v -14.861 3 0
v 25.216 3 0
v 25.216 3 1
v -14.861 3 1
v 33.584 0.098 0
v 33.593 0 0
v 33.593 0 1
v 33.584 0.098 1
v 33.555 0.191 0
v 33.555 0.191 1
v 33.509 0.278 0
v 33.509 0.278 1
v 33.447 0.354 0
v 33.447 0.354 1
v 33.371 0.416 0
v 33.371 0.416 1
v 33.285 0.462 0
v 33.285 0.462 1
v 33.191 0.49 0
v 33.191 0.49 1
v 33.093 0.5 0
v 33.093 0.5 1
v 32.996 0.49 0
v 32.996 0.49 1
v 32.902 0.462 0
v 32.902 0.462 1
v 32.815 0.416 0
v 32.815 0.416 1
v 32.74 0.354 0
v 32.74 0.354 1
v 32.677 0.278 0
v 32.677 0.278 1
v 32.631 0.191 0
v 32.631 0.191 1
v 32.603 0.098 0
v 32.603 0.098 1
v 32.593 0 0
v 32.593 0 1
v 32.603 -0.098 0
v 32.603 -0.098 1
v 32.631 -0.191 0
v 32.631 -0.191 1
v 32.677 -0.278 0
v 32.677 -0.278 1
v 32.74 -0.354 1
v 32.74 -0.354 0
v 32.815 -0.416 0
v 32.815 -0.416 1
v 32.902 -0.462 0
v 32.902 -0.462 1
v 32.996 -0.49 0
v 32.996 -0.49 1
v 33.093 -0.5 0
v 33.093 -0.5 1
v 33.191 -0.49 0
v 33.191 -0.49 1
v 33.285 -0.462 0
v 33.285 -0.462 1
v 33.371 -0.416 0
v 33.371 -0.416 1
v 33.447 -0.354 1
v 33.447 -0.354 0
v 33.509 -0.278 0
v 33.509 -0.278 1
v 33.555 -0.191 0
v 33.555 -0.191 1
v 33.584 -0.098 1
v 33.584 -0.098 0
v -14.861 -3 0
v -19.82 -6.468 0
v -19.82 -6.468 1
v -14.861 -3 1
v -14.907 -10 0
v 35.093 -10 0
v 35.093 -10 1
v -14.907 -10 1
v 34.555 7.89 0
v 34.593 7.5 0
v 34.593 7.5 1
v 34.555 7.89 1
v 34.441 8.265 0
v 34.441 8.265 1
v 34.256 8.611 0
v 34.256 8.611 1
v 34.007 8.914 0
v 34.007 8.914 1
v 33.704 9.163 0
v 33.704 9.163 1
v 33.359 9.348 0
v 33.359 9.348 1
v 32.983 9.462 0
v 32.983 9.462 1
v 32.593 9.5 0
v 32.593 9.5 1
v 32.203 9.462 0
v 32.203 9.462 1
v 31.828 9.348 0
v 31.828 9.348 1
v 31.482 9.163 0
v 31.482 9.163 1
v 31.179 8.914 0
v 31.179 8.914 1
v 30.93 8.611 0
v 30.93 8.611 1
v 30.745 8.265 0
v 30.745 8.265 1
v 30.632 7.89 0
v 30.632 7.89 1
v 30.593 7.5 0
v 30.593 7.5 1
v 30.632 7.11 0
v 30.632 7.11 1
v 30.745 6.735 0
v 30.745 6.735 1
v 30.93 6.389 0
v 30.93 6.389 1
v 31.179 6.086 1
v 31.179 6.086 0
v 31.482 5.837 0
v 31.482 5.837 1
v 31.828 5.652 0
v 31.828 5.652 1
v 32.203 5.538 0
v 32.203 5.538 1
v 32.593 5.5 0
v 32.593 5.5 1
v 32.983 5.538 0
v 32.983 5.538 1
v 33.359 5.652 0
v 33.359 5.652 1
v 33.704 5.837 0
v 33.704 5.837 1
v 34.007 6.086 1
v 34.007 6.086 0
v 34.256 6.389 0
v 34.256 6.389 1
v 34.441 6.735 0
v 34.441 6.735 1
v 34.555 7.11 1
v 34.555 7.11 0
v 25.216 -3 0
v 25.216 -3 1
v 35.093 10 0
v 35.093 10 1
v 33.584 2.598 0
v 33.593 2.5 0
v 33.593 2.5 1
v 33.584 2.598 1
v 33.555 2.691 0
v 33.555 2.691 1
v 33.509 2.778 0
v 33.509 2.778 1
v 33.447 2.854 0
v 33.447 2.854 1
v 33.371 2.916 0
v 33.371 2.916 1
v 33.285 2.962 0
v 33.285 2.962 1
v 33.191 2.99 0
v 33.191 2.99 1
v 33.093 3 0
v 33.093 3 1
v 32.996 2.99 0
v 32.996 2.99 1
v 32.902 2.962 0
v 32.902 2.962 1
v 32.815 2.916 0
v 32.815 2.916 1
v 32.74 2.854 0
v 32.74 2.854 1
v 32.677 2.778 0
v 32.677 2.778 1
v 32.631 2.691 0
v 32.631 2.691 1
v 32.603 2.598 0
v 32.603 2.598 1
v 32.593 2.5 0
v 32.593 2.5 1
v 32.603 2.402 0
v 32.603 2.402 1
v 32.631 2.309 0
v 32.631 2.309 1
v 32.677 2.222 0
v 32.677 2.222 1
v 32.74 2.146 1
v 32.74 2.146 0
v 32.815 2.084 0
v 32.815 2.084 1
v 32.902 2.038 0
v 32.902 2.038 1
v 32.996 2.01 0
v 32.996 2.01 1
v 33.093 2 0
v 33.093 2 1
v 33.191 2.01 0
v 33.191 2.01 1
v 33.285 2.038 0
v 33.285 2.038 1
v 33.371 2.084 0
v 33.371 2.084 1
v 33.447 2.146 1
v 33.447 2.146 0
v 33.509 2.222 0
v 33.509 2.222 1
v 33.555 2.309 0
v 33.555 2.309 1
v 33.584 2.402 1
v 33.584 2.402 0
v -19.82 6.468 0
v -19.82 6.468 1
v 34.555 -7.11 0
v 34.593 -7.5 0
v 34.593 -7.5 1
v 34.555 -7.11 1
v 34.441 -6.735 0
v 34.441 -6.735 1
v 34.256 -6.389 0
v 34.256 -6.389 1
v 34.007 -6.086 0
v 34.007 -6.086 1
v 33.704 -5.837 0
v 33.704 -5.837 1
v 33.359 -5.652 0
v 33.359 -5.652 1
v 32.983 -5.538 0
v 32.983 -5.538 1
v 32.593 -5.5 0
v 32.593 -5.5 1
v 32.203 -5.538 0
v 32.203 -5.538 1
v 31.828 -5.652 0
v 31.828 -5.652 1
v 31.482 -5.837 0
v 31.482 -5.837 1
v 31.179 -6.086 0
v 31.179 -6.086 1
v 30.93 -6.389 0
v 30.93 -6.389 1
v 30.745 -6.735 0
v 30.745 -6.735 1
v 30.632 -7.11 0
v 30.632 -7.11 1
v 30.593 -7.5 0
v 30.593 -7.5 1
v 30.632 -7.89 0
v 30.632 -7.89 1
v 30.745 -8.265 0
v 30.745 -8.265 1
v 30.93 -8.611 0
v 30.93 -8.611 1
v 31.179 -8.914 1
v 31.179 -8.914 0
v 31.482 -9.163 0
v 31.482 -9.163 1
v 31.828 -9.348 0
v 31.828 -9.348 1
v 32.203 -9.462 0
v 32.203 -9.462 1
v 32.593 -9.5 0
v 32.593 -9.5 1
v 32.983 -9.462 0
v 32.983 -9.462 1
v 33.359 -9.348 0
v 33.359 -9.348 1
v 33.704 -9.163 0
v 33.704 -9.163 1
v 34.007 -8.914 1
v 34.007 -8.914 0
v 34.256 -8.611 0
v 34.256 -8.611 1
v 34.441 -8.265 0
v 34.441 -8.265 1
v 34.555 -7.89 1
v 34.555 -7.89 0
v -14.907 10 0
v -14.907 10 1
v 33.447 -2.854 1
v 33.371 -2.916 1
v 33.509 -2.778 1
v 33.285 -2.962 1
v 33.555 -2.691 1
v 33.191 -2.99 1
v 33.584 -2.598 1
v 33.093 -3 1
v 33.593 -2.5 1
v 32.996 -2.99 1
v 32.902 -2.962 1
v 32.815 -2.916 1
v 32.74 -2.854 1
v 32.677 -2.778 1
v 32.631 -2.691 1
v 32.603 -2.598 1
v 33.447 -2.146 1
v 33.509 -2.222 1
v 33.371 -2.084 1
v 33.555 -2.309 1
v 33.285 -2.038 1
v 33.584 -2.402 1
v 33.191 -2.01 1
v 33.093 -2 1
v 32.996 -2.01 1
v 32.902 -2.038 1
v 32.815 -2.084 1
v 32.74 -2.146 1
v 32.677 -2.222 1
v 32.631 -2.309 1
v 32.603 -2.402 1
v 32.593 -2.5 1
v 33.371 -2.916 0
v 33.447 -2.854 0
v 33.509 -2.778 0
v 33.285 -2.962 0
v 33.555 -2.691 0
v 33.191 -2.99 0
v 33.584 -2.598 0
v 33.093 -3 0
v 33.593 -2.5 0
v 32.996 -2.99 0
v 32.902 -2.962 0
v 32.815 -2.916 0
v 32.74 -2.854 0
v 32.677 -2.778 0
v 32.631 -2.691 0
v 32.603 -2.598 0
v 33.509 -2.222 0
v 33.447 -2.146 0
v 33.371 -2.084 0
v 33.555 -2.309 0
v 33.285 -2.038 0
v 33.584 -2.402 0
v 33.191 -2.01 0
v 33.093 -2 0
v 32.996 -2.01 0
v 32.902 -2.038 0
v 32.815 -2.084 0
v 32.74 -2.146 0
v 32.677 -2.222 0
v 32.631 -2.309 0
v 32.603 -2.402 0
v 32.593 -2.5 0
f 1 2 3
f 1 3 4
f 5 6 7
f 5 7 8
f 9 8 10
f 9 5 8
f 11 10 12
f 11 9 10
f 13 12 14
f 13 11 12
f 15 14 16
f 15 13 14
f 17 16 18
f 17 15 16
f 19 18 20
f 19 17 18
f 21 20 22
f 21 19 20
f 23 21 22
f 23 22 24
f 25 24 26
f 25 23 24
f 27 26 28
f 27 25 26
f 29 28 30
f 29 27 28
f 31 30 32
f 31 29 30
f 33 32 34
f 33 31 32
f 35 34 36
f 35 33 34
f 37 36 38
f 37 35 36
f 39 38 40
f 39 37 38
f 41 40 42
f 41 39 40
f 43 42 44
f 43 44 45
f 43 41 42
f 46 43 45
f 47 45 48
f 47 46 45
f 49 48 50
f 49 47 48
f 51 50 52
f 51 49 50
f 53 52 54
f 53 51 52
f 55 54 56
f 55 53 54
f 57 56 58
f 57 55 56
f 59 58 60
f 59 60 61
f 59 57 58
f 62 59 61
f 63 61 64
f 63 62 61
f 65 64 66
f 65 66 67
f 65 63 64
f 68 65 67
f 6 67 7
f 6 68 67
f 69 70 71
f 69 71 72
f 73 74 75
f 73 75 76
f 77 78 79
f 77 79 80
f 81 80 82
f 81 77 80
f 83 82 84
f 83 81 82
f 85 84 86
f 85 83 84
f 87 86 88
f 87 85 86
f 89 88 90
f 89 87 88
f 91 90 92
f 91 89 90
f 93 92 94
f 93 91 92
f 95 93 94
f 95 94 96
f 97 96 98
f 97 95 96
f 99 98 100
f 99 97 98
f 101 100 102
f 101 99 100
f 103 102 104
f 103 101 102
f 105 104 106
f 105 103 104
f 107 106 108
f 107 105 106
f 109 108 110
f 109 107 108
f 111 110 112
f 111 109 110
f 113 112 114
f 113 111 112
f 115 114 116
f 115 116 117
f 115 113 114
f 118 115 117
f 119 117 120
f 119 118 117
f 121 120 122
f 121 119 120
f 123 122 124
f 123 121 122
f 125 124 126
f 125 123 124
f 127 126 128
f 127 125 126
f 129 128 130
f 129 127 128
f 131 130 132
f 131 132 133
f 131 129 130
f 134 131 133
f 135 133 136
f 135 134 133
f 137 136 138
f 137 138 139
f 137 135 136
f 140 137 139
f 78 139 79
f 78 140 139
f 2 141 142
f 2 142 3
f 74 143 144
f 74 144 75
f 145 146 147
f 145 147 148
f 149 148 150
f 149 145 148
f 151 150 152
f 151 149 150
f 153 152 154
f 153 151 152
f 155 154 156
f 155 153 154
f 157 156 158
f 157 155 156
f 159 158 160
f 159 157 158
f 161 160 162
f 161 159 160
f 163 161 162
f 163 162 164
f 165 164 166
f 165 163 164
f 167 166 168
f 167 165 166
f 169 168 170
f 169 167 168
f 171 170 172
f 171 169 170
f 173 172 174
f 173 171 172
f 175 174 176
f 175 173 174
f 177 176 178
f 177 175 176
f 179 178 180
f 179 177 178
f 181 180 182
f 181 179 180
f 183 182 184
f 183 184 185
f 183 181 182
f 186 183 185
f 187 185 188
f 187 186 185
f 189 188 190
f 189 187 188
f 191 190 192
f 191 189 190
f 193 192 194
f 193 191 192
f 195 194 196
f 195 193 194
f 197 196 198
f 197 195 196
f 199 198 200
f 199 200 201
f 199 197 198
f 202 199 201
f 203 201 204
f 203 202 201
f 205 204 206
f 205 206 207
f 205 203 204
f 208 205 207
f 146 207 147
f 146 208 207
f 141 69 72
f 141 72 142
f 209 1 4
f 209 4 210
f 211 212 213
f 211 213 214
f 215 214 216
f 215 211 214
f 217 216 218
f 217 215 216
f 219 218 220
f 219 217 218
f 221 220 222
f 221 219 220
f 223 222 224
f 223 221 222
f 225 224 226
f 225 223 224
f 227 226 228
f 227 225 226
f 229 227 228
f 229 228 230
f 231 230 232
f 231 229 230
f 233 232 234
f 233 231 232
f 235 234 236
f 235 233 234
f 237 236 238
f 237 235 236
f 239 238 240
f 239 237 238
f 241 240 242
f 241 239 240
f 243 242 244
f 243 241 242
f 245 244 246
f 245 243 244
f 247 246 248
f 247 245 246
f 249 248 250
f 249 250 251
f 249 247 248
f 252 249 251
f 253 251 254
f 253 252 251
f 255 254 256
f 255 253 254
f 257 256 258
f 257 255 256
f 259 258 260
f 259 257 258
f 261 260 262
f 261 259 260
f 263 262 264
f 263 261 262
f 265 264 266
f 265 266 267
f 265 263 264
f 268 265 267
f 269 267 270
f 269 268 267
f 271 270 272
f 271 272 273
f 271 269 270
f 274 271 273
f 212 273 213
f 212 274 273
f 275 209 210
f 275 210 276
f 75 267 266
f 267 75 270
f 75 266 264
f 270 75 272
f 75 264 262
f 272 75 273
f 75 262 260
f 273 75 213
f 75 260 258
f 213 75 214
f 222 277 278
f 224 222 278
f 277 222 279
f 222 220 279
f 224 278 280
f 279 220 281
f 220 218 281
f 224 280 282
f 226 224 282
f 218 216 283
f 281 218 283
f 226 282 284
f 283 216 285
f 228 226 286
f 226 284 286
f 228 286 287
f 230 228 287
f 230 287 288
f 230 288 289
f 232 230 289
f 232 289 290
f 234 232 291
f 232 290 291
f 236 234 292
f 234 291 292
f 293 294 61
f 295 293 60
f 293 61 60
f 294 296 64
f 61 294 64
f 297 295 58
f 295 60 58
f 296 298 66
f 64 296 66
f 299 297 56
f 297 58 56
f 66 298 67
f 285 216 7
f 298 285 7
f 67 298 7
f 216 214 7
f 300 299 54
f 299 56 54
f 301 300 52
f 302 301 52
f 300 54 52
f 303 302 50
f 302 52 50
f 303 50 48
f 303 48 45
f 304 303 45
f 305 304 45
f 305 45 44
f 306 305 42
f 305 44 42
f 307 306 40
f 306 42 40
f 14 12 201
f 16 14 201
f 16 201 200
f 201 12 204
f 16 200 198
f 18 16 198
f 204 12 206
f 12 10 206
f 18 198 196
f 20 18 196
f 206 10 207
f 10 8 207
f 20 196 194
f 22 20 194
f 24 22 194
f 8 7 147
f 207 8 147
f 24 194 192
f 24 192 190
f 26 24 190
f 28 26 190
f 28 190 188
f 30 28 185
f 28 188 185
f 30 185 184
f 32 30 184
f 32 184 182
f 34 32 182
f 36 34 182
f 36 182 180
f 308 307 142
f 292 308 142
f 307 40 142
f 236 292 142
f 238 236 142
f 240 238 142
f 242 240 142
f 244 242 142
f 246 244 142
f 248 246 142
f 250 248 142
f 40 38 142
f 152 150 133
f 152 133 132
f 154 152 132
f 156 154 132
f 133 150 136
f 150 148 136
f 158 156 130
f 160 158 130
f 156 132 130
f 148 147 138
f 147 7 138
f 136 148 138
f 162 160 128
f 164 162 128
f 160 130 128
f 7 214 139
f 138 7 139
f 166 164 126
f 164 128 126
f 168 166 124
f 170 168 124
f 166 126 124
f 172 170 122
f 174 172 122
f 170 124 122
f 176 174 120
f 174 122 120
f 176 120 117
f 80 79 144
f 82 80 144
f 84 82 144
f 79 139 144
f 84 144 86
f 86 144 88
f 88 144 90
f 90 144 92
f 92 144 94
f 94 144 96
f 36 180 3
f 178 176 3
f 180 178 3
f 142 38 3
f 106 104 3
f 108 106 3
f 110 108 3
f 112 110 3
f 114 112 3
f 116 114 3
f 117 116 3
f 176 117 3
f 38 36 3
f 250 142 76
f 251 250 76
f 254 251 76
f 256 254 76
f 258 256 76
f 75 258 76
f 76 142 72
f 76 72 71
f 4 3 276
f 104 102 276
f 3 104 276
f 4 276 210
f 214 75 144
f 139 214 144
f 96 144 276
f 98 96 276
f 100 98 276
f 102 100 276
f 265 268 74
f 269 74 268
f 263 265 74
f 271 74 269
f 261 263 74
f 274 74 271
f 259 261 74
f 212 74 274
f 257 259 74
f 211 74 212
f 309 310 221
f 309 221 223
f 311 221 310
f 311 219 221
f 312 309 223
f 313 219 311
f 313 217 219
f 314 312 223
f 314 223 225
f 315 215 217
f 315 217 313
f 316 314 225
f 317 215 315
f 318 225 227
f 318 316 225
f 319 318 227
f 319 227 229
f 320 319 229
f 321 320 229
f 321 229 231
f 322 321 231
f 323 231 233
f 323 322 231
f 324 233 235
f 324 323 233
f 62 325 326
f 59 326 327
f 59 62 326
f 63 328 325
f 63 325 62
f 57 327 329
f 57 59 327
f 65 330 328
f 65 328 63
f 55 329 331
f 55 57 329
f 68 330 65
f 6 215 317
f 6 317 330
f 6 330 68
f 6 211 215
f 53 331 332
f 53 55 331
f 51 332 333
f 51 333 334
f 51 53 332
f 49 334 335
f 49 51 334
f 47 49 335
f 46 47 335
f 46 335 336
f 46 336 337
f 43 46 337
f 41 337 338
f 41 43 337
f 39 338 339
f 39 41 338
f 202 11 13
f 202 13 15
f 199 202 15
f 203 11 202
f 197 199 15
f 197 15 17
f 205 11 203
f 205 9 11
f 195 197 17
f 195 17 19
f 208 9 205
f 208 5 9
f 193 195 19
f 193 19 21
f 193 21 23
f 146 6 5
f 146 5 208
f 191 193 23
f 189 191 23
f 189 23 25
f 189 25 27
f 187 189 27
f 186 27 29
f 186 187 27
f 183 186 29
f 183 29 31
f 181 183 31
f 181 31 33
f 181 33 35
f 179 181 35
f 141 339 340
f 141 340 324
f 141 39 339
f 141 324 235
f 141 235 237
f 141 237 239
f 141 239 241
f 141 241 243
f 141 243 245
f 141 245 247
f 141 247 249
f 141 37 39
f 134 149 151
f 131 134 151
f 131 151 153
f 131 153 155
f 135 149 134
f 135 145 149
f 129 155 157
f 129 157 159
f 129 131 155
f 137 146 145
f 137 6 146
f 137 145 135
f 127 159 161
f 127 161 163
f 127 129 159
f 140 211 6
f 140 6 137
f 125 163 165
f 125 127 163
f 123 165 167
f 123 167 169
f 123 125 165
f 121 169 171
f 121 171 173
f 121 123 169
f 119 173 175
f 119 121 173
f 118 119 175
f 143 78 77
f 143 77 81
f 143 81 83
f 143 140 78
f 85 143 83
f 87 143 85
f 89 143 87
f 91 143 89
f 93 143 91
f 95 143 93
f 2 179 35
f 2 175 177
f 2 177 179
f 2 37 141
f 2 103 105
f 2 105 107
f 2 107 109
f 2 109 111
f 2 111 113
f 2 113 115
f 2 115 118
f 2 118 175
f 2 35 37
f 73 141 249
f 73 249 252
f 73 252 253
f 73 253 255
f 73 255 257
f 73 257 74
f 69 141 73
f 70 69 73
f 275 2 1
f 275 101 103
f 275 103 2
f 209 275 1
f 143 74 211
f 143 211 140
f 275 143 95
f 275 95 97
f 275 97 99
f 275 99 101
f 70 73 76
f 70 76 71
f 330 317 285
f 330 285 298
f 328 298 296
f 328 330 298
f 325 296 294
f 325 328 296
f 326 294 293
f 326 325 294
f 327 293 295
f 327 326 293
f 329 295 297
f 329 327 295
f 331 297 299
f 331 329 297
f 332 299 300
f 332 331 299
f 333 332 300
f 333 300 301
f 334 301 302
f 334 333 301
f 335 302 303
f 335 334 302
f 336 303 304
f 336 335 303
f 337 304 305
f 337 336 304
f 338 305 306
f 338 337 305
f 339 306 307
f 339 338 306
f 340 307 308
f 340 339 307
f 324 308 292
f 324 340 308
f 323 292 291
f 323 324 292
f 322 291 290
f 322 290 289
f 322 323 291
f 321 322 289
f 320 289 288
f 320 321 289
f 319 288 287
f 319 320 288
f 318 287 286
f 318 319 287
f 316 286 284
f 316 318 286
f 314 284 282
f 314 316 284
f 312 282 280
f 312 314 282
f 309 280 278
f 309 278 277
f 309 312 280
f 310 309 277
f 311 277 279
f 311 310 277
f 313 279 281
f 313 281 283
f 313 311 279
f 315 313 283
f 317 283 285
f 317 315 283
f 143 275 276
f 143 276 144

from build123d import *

# Parameters (mm, degrees)
SKETCH_R   = 2
SKETCH_R_2 = 0.5
PAD_DEPTH  = 1


with BuildPart() as part:
    # Sketch → Pad (new body)
    with BuildSketch(Plane.XY):
        Polygon((35.093211, 10), (35.093211, -10), (-14.906789, -10), (-19.819749, -6.468102), (-14.861446, -3.000147), (25.216118, -3.000147), (25.216118, 3.000147), (-14.861446, 3.000147), (-19.819749, 6.468102), (-14.906789, 10), align=None)
        with Locations((32.593211, 7.5)):
            Circle(SKETCH_R, mode=Mode.SUBTRACT)
        with Locations((32.593211, -7.5)):
            Circle(SKETCH_R, mode=Mode.SUBTRACT)
        with Locations((33.093211, 2.5)):
            Circle(SKETCH_R_2, mode=Mode.SUBTRACT)
        with Locations((33.093211, 0)):
            Circle(SKETCH_R_2, mode=Mode.SUBTRACT)
        with Locations((33.093211, -2.5)):
            Circle(SKETCH_R_2, mode=Mode.SUBTRACT)
    extrude(amount=PAD_DEPTH)


solid = part.part
